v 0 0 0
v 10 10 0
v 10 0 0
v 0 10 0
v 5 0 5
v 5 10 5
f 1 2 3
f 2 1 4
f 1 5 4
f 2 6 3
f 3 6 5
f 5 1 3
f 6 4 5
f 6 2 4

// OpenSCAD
//Roof module
//call function
roof(10);


//module for roof
module roof(cube_size) {
    //constant dimensions
    width = 50;    
    depth = 20;   
    roof_height = 10;  
    
    points = [ 
        [0, 0, 0], [width, 0, 0], [width,depth, 0], [0, depth, 0], //rectangle base corners
        [width / 2, 0, roof_height], [width / 2,depth,roof_height]      //roof corners
    ];
    faces = [ 
        [0, 1, 2, 3],   // base
        [3, 4, 0],      // left triangle
        [1, 5, 2],      // right triangle
        [4, 5, 1, 0],   // front side
        [5, 4, 3, 2]    // back side
    ];
    x = cube_size/width;
    y = cube_size/depth;
    z = cube_size/depth;
    scale([x,y,z]){
        polyhedron(points, faces, convexity = 10);
    }
}
//******** End of Module ********
